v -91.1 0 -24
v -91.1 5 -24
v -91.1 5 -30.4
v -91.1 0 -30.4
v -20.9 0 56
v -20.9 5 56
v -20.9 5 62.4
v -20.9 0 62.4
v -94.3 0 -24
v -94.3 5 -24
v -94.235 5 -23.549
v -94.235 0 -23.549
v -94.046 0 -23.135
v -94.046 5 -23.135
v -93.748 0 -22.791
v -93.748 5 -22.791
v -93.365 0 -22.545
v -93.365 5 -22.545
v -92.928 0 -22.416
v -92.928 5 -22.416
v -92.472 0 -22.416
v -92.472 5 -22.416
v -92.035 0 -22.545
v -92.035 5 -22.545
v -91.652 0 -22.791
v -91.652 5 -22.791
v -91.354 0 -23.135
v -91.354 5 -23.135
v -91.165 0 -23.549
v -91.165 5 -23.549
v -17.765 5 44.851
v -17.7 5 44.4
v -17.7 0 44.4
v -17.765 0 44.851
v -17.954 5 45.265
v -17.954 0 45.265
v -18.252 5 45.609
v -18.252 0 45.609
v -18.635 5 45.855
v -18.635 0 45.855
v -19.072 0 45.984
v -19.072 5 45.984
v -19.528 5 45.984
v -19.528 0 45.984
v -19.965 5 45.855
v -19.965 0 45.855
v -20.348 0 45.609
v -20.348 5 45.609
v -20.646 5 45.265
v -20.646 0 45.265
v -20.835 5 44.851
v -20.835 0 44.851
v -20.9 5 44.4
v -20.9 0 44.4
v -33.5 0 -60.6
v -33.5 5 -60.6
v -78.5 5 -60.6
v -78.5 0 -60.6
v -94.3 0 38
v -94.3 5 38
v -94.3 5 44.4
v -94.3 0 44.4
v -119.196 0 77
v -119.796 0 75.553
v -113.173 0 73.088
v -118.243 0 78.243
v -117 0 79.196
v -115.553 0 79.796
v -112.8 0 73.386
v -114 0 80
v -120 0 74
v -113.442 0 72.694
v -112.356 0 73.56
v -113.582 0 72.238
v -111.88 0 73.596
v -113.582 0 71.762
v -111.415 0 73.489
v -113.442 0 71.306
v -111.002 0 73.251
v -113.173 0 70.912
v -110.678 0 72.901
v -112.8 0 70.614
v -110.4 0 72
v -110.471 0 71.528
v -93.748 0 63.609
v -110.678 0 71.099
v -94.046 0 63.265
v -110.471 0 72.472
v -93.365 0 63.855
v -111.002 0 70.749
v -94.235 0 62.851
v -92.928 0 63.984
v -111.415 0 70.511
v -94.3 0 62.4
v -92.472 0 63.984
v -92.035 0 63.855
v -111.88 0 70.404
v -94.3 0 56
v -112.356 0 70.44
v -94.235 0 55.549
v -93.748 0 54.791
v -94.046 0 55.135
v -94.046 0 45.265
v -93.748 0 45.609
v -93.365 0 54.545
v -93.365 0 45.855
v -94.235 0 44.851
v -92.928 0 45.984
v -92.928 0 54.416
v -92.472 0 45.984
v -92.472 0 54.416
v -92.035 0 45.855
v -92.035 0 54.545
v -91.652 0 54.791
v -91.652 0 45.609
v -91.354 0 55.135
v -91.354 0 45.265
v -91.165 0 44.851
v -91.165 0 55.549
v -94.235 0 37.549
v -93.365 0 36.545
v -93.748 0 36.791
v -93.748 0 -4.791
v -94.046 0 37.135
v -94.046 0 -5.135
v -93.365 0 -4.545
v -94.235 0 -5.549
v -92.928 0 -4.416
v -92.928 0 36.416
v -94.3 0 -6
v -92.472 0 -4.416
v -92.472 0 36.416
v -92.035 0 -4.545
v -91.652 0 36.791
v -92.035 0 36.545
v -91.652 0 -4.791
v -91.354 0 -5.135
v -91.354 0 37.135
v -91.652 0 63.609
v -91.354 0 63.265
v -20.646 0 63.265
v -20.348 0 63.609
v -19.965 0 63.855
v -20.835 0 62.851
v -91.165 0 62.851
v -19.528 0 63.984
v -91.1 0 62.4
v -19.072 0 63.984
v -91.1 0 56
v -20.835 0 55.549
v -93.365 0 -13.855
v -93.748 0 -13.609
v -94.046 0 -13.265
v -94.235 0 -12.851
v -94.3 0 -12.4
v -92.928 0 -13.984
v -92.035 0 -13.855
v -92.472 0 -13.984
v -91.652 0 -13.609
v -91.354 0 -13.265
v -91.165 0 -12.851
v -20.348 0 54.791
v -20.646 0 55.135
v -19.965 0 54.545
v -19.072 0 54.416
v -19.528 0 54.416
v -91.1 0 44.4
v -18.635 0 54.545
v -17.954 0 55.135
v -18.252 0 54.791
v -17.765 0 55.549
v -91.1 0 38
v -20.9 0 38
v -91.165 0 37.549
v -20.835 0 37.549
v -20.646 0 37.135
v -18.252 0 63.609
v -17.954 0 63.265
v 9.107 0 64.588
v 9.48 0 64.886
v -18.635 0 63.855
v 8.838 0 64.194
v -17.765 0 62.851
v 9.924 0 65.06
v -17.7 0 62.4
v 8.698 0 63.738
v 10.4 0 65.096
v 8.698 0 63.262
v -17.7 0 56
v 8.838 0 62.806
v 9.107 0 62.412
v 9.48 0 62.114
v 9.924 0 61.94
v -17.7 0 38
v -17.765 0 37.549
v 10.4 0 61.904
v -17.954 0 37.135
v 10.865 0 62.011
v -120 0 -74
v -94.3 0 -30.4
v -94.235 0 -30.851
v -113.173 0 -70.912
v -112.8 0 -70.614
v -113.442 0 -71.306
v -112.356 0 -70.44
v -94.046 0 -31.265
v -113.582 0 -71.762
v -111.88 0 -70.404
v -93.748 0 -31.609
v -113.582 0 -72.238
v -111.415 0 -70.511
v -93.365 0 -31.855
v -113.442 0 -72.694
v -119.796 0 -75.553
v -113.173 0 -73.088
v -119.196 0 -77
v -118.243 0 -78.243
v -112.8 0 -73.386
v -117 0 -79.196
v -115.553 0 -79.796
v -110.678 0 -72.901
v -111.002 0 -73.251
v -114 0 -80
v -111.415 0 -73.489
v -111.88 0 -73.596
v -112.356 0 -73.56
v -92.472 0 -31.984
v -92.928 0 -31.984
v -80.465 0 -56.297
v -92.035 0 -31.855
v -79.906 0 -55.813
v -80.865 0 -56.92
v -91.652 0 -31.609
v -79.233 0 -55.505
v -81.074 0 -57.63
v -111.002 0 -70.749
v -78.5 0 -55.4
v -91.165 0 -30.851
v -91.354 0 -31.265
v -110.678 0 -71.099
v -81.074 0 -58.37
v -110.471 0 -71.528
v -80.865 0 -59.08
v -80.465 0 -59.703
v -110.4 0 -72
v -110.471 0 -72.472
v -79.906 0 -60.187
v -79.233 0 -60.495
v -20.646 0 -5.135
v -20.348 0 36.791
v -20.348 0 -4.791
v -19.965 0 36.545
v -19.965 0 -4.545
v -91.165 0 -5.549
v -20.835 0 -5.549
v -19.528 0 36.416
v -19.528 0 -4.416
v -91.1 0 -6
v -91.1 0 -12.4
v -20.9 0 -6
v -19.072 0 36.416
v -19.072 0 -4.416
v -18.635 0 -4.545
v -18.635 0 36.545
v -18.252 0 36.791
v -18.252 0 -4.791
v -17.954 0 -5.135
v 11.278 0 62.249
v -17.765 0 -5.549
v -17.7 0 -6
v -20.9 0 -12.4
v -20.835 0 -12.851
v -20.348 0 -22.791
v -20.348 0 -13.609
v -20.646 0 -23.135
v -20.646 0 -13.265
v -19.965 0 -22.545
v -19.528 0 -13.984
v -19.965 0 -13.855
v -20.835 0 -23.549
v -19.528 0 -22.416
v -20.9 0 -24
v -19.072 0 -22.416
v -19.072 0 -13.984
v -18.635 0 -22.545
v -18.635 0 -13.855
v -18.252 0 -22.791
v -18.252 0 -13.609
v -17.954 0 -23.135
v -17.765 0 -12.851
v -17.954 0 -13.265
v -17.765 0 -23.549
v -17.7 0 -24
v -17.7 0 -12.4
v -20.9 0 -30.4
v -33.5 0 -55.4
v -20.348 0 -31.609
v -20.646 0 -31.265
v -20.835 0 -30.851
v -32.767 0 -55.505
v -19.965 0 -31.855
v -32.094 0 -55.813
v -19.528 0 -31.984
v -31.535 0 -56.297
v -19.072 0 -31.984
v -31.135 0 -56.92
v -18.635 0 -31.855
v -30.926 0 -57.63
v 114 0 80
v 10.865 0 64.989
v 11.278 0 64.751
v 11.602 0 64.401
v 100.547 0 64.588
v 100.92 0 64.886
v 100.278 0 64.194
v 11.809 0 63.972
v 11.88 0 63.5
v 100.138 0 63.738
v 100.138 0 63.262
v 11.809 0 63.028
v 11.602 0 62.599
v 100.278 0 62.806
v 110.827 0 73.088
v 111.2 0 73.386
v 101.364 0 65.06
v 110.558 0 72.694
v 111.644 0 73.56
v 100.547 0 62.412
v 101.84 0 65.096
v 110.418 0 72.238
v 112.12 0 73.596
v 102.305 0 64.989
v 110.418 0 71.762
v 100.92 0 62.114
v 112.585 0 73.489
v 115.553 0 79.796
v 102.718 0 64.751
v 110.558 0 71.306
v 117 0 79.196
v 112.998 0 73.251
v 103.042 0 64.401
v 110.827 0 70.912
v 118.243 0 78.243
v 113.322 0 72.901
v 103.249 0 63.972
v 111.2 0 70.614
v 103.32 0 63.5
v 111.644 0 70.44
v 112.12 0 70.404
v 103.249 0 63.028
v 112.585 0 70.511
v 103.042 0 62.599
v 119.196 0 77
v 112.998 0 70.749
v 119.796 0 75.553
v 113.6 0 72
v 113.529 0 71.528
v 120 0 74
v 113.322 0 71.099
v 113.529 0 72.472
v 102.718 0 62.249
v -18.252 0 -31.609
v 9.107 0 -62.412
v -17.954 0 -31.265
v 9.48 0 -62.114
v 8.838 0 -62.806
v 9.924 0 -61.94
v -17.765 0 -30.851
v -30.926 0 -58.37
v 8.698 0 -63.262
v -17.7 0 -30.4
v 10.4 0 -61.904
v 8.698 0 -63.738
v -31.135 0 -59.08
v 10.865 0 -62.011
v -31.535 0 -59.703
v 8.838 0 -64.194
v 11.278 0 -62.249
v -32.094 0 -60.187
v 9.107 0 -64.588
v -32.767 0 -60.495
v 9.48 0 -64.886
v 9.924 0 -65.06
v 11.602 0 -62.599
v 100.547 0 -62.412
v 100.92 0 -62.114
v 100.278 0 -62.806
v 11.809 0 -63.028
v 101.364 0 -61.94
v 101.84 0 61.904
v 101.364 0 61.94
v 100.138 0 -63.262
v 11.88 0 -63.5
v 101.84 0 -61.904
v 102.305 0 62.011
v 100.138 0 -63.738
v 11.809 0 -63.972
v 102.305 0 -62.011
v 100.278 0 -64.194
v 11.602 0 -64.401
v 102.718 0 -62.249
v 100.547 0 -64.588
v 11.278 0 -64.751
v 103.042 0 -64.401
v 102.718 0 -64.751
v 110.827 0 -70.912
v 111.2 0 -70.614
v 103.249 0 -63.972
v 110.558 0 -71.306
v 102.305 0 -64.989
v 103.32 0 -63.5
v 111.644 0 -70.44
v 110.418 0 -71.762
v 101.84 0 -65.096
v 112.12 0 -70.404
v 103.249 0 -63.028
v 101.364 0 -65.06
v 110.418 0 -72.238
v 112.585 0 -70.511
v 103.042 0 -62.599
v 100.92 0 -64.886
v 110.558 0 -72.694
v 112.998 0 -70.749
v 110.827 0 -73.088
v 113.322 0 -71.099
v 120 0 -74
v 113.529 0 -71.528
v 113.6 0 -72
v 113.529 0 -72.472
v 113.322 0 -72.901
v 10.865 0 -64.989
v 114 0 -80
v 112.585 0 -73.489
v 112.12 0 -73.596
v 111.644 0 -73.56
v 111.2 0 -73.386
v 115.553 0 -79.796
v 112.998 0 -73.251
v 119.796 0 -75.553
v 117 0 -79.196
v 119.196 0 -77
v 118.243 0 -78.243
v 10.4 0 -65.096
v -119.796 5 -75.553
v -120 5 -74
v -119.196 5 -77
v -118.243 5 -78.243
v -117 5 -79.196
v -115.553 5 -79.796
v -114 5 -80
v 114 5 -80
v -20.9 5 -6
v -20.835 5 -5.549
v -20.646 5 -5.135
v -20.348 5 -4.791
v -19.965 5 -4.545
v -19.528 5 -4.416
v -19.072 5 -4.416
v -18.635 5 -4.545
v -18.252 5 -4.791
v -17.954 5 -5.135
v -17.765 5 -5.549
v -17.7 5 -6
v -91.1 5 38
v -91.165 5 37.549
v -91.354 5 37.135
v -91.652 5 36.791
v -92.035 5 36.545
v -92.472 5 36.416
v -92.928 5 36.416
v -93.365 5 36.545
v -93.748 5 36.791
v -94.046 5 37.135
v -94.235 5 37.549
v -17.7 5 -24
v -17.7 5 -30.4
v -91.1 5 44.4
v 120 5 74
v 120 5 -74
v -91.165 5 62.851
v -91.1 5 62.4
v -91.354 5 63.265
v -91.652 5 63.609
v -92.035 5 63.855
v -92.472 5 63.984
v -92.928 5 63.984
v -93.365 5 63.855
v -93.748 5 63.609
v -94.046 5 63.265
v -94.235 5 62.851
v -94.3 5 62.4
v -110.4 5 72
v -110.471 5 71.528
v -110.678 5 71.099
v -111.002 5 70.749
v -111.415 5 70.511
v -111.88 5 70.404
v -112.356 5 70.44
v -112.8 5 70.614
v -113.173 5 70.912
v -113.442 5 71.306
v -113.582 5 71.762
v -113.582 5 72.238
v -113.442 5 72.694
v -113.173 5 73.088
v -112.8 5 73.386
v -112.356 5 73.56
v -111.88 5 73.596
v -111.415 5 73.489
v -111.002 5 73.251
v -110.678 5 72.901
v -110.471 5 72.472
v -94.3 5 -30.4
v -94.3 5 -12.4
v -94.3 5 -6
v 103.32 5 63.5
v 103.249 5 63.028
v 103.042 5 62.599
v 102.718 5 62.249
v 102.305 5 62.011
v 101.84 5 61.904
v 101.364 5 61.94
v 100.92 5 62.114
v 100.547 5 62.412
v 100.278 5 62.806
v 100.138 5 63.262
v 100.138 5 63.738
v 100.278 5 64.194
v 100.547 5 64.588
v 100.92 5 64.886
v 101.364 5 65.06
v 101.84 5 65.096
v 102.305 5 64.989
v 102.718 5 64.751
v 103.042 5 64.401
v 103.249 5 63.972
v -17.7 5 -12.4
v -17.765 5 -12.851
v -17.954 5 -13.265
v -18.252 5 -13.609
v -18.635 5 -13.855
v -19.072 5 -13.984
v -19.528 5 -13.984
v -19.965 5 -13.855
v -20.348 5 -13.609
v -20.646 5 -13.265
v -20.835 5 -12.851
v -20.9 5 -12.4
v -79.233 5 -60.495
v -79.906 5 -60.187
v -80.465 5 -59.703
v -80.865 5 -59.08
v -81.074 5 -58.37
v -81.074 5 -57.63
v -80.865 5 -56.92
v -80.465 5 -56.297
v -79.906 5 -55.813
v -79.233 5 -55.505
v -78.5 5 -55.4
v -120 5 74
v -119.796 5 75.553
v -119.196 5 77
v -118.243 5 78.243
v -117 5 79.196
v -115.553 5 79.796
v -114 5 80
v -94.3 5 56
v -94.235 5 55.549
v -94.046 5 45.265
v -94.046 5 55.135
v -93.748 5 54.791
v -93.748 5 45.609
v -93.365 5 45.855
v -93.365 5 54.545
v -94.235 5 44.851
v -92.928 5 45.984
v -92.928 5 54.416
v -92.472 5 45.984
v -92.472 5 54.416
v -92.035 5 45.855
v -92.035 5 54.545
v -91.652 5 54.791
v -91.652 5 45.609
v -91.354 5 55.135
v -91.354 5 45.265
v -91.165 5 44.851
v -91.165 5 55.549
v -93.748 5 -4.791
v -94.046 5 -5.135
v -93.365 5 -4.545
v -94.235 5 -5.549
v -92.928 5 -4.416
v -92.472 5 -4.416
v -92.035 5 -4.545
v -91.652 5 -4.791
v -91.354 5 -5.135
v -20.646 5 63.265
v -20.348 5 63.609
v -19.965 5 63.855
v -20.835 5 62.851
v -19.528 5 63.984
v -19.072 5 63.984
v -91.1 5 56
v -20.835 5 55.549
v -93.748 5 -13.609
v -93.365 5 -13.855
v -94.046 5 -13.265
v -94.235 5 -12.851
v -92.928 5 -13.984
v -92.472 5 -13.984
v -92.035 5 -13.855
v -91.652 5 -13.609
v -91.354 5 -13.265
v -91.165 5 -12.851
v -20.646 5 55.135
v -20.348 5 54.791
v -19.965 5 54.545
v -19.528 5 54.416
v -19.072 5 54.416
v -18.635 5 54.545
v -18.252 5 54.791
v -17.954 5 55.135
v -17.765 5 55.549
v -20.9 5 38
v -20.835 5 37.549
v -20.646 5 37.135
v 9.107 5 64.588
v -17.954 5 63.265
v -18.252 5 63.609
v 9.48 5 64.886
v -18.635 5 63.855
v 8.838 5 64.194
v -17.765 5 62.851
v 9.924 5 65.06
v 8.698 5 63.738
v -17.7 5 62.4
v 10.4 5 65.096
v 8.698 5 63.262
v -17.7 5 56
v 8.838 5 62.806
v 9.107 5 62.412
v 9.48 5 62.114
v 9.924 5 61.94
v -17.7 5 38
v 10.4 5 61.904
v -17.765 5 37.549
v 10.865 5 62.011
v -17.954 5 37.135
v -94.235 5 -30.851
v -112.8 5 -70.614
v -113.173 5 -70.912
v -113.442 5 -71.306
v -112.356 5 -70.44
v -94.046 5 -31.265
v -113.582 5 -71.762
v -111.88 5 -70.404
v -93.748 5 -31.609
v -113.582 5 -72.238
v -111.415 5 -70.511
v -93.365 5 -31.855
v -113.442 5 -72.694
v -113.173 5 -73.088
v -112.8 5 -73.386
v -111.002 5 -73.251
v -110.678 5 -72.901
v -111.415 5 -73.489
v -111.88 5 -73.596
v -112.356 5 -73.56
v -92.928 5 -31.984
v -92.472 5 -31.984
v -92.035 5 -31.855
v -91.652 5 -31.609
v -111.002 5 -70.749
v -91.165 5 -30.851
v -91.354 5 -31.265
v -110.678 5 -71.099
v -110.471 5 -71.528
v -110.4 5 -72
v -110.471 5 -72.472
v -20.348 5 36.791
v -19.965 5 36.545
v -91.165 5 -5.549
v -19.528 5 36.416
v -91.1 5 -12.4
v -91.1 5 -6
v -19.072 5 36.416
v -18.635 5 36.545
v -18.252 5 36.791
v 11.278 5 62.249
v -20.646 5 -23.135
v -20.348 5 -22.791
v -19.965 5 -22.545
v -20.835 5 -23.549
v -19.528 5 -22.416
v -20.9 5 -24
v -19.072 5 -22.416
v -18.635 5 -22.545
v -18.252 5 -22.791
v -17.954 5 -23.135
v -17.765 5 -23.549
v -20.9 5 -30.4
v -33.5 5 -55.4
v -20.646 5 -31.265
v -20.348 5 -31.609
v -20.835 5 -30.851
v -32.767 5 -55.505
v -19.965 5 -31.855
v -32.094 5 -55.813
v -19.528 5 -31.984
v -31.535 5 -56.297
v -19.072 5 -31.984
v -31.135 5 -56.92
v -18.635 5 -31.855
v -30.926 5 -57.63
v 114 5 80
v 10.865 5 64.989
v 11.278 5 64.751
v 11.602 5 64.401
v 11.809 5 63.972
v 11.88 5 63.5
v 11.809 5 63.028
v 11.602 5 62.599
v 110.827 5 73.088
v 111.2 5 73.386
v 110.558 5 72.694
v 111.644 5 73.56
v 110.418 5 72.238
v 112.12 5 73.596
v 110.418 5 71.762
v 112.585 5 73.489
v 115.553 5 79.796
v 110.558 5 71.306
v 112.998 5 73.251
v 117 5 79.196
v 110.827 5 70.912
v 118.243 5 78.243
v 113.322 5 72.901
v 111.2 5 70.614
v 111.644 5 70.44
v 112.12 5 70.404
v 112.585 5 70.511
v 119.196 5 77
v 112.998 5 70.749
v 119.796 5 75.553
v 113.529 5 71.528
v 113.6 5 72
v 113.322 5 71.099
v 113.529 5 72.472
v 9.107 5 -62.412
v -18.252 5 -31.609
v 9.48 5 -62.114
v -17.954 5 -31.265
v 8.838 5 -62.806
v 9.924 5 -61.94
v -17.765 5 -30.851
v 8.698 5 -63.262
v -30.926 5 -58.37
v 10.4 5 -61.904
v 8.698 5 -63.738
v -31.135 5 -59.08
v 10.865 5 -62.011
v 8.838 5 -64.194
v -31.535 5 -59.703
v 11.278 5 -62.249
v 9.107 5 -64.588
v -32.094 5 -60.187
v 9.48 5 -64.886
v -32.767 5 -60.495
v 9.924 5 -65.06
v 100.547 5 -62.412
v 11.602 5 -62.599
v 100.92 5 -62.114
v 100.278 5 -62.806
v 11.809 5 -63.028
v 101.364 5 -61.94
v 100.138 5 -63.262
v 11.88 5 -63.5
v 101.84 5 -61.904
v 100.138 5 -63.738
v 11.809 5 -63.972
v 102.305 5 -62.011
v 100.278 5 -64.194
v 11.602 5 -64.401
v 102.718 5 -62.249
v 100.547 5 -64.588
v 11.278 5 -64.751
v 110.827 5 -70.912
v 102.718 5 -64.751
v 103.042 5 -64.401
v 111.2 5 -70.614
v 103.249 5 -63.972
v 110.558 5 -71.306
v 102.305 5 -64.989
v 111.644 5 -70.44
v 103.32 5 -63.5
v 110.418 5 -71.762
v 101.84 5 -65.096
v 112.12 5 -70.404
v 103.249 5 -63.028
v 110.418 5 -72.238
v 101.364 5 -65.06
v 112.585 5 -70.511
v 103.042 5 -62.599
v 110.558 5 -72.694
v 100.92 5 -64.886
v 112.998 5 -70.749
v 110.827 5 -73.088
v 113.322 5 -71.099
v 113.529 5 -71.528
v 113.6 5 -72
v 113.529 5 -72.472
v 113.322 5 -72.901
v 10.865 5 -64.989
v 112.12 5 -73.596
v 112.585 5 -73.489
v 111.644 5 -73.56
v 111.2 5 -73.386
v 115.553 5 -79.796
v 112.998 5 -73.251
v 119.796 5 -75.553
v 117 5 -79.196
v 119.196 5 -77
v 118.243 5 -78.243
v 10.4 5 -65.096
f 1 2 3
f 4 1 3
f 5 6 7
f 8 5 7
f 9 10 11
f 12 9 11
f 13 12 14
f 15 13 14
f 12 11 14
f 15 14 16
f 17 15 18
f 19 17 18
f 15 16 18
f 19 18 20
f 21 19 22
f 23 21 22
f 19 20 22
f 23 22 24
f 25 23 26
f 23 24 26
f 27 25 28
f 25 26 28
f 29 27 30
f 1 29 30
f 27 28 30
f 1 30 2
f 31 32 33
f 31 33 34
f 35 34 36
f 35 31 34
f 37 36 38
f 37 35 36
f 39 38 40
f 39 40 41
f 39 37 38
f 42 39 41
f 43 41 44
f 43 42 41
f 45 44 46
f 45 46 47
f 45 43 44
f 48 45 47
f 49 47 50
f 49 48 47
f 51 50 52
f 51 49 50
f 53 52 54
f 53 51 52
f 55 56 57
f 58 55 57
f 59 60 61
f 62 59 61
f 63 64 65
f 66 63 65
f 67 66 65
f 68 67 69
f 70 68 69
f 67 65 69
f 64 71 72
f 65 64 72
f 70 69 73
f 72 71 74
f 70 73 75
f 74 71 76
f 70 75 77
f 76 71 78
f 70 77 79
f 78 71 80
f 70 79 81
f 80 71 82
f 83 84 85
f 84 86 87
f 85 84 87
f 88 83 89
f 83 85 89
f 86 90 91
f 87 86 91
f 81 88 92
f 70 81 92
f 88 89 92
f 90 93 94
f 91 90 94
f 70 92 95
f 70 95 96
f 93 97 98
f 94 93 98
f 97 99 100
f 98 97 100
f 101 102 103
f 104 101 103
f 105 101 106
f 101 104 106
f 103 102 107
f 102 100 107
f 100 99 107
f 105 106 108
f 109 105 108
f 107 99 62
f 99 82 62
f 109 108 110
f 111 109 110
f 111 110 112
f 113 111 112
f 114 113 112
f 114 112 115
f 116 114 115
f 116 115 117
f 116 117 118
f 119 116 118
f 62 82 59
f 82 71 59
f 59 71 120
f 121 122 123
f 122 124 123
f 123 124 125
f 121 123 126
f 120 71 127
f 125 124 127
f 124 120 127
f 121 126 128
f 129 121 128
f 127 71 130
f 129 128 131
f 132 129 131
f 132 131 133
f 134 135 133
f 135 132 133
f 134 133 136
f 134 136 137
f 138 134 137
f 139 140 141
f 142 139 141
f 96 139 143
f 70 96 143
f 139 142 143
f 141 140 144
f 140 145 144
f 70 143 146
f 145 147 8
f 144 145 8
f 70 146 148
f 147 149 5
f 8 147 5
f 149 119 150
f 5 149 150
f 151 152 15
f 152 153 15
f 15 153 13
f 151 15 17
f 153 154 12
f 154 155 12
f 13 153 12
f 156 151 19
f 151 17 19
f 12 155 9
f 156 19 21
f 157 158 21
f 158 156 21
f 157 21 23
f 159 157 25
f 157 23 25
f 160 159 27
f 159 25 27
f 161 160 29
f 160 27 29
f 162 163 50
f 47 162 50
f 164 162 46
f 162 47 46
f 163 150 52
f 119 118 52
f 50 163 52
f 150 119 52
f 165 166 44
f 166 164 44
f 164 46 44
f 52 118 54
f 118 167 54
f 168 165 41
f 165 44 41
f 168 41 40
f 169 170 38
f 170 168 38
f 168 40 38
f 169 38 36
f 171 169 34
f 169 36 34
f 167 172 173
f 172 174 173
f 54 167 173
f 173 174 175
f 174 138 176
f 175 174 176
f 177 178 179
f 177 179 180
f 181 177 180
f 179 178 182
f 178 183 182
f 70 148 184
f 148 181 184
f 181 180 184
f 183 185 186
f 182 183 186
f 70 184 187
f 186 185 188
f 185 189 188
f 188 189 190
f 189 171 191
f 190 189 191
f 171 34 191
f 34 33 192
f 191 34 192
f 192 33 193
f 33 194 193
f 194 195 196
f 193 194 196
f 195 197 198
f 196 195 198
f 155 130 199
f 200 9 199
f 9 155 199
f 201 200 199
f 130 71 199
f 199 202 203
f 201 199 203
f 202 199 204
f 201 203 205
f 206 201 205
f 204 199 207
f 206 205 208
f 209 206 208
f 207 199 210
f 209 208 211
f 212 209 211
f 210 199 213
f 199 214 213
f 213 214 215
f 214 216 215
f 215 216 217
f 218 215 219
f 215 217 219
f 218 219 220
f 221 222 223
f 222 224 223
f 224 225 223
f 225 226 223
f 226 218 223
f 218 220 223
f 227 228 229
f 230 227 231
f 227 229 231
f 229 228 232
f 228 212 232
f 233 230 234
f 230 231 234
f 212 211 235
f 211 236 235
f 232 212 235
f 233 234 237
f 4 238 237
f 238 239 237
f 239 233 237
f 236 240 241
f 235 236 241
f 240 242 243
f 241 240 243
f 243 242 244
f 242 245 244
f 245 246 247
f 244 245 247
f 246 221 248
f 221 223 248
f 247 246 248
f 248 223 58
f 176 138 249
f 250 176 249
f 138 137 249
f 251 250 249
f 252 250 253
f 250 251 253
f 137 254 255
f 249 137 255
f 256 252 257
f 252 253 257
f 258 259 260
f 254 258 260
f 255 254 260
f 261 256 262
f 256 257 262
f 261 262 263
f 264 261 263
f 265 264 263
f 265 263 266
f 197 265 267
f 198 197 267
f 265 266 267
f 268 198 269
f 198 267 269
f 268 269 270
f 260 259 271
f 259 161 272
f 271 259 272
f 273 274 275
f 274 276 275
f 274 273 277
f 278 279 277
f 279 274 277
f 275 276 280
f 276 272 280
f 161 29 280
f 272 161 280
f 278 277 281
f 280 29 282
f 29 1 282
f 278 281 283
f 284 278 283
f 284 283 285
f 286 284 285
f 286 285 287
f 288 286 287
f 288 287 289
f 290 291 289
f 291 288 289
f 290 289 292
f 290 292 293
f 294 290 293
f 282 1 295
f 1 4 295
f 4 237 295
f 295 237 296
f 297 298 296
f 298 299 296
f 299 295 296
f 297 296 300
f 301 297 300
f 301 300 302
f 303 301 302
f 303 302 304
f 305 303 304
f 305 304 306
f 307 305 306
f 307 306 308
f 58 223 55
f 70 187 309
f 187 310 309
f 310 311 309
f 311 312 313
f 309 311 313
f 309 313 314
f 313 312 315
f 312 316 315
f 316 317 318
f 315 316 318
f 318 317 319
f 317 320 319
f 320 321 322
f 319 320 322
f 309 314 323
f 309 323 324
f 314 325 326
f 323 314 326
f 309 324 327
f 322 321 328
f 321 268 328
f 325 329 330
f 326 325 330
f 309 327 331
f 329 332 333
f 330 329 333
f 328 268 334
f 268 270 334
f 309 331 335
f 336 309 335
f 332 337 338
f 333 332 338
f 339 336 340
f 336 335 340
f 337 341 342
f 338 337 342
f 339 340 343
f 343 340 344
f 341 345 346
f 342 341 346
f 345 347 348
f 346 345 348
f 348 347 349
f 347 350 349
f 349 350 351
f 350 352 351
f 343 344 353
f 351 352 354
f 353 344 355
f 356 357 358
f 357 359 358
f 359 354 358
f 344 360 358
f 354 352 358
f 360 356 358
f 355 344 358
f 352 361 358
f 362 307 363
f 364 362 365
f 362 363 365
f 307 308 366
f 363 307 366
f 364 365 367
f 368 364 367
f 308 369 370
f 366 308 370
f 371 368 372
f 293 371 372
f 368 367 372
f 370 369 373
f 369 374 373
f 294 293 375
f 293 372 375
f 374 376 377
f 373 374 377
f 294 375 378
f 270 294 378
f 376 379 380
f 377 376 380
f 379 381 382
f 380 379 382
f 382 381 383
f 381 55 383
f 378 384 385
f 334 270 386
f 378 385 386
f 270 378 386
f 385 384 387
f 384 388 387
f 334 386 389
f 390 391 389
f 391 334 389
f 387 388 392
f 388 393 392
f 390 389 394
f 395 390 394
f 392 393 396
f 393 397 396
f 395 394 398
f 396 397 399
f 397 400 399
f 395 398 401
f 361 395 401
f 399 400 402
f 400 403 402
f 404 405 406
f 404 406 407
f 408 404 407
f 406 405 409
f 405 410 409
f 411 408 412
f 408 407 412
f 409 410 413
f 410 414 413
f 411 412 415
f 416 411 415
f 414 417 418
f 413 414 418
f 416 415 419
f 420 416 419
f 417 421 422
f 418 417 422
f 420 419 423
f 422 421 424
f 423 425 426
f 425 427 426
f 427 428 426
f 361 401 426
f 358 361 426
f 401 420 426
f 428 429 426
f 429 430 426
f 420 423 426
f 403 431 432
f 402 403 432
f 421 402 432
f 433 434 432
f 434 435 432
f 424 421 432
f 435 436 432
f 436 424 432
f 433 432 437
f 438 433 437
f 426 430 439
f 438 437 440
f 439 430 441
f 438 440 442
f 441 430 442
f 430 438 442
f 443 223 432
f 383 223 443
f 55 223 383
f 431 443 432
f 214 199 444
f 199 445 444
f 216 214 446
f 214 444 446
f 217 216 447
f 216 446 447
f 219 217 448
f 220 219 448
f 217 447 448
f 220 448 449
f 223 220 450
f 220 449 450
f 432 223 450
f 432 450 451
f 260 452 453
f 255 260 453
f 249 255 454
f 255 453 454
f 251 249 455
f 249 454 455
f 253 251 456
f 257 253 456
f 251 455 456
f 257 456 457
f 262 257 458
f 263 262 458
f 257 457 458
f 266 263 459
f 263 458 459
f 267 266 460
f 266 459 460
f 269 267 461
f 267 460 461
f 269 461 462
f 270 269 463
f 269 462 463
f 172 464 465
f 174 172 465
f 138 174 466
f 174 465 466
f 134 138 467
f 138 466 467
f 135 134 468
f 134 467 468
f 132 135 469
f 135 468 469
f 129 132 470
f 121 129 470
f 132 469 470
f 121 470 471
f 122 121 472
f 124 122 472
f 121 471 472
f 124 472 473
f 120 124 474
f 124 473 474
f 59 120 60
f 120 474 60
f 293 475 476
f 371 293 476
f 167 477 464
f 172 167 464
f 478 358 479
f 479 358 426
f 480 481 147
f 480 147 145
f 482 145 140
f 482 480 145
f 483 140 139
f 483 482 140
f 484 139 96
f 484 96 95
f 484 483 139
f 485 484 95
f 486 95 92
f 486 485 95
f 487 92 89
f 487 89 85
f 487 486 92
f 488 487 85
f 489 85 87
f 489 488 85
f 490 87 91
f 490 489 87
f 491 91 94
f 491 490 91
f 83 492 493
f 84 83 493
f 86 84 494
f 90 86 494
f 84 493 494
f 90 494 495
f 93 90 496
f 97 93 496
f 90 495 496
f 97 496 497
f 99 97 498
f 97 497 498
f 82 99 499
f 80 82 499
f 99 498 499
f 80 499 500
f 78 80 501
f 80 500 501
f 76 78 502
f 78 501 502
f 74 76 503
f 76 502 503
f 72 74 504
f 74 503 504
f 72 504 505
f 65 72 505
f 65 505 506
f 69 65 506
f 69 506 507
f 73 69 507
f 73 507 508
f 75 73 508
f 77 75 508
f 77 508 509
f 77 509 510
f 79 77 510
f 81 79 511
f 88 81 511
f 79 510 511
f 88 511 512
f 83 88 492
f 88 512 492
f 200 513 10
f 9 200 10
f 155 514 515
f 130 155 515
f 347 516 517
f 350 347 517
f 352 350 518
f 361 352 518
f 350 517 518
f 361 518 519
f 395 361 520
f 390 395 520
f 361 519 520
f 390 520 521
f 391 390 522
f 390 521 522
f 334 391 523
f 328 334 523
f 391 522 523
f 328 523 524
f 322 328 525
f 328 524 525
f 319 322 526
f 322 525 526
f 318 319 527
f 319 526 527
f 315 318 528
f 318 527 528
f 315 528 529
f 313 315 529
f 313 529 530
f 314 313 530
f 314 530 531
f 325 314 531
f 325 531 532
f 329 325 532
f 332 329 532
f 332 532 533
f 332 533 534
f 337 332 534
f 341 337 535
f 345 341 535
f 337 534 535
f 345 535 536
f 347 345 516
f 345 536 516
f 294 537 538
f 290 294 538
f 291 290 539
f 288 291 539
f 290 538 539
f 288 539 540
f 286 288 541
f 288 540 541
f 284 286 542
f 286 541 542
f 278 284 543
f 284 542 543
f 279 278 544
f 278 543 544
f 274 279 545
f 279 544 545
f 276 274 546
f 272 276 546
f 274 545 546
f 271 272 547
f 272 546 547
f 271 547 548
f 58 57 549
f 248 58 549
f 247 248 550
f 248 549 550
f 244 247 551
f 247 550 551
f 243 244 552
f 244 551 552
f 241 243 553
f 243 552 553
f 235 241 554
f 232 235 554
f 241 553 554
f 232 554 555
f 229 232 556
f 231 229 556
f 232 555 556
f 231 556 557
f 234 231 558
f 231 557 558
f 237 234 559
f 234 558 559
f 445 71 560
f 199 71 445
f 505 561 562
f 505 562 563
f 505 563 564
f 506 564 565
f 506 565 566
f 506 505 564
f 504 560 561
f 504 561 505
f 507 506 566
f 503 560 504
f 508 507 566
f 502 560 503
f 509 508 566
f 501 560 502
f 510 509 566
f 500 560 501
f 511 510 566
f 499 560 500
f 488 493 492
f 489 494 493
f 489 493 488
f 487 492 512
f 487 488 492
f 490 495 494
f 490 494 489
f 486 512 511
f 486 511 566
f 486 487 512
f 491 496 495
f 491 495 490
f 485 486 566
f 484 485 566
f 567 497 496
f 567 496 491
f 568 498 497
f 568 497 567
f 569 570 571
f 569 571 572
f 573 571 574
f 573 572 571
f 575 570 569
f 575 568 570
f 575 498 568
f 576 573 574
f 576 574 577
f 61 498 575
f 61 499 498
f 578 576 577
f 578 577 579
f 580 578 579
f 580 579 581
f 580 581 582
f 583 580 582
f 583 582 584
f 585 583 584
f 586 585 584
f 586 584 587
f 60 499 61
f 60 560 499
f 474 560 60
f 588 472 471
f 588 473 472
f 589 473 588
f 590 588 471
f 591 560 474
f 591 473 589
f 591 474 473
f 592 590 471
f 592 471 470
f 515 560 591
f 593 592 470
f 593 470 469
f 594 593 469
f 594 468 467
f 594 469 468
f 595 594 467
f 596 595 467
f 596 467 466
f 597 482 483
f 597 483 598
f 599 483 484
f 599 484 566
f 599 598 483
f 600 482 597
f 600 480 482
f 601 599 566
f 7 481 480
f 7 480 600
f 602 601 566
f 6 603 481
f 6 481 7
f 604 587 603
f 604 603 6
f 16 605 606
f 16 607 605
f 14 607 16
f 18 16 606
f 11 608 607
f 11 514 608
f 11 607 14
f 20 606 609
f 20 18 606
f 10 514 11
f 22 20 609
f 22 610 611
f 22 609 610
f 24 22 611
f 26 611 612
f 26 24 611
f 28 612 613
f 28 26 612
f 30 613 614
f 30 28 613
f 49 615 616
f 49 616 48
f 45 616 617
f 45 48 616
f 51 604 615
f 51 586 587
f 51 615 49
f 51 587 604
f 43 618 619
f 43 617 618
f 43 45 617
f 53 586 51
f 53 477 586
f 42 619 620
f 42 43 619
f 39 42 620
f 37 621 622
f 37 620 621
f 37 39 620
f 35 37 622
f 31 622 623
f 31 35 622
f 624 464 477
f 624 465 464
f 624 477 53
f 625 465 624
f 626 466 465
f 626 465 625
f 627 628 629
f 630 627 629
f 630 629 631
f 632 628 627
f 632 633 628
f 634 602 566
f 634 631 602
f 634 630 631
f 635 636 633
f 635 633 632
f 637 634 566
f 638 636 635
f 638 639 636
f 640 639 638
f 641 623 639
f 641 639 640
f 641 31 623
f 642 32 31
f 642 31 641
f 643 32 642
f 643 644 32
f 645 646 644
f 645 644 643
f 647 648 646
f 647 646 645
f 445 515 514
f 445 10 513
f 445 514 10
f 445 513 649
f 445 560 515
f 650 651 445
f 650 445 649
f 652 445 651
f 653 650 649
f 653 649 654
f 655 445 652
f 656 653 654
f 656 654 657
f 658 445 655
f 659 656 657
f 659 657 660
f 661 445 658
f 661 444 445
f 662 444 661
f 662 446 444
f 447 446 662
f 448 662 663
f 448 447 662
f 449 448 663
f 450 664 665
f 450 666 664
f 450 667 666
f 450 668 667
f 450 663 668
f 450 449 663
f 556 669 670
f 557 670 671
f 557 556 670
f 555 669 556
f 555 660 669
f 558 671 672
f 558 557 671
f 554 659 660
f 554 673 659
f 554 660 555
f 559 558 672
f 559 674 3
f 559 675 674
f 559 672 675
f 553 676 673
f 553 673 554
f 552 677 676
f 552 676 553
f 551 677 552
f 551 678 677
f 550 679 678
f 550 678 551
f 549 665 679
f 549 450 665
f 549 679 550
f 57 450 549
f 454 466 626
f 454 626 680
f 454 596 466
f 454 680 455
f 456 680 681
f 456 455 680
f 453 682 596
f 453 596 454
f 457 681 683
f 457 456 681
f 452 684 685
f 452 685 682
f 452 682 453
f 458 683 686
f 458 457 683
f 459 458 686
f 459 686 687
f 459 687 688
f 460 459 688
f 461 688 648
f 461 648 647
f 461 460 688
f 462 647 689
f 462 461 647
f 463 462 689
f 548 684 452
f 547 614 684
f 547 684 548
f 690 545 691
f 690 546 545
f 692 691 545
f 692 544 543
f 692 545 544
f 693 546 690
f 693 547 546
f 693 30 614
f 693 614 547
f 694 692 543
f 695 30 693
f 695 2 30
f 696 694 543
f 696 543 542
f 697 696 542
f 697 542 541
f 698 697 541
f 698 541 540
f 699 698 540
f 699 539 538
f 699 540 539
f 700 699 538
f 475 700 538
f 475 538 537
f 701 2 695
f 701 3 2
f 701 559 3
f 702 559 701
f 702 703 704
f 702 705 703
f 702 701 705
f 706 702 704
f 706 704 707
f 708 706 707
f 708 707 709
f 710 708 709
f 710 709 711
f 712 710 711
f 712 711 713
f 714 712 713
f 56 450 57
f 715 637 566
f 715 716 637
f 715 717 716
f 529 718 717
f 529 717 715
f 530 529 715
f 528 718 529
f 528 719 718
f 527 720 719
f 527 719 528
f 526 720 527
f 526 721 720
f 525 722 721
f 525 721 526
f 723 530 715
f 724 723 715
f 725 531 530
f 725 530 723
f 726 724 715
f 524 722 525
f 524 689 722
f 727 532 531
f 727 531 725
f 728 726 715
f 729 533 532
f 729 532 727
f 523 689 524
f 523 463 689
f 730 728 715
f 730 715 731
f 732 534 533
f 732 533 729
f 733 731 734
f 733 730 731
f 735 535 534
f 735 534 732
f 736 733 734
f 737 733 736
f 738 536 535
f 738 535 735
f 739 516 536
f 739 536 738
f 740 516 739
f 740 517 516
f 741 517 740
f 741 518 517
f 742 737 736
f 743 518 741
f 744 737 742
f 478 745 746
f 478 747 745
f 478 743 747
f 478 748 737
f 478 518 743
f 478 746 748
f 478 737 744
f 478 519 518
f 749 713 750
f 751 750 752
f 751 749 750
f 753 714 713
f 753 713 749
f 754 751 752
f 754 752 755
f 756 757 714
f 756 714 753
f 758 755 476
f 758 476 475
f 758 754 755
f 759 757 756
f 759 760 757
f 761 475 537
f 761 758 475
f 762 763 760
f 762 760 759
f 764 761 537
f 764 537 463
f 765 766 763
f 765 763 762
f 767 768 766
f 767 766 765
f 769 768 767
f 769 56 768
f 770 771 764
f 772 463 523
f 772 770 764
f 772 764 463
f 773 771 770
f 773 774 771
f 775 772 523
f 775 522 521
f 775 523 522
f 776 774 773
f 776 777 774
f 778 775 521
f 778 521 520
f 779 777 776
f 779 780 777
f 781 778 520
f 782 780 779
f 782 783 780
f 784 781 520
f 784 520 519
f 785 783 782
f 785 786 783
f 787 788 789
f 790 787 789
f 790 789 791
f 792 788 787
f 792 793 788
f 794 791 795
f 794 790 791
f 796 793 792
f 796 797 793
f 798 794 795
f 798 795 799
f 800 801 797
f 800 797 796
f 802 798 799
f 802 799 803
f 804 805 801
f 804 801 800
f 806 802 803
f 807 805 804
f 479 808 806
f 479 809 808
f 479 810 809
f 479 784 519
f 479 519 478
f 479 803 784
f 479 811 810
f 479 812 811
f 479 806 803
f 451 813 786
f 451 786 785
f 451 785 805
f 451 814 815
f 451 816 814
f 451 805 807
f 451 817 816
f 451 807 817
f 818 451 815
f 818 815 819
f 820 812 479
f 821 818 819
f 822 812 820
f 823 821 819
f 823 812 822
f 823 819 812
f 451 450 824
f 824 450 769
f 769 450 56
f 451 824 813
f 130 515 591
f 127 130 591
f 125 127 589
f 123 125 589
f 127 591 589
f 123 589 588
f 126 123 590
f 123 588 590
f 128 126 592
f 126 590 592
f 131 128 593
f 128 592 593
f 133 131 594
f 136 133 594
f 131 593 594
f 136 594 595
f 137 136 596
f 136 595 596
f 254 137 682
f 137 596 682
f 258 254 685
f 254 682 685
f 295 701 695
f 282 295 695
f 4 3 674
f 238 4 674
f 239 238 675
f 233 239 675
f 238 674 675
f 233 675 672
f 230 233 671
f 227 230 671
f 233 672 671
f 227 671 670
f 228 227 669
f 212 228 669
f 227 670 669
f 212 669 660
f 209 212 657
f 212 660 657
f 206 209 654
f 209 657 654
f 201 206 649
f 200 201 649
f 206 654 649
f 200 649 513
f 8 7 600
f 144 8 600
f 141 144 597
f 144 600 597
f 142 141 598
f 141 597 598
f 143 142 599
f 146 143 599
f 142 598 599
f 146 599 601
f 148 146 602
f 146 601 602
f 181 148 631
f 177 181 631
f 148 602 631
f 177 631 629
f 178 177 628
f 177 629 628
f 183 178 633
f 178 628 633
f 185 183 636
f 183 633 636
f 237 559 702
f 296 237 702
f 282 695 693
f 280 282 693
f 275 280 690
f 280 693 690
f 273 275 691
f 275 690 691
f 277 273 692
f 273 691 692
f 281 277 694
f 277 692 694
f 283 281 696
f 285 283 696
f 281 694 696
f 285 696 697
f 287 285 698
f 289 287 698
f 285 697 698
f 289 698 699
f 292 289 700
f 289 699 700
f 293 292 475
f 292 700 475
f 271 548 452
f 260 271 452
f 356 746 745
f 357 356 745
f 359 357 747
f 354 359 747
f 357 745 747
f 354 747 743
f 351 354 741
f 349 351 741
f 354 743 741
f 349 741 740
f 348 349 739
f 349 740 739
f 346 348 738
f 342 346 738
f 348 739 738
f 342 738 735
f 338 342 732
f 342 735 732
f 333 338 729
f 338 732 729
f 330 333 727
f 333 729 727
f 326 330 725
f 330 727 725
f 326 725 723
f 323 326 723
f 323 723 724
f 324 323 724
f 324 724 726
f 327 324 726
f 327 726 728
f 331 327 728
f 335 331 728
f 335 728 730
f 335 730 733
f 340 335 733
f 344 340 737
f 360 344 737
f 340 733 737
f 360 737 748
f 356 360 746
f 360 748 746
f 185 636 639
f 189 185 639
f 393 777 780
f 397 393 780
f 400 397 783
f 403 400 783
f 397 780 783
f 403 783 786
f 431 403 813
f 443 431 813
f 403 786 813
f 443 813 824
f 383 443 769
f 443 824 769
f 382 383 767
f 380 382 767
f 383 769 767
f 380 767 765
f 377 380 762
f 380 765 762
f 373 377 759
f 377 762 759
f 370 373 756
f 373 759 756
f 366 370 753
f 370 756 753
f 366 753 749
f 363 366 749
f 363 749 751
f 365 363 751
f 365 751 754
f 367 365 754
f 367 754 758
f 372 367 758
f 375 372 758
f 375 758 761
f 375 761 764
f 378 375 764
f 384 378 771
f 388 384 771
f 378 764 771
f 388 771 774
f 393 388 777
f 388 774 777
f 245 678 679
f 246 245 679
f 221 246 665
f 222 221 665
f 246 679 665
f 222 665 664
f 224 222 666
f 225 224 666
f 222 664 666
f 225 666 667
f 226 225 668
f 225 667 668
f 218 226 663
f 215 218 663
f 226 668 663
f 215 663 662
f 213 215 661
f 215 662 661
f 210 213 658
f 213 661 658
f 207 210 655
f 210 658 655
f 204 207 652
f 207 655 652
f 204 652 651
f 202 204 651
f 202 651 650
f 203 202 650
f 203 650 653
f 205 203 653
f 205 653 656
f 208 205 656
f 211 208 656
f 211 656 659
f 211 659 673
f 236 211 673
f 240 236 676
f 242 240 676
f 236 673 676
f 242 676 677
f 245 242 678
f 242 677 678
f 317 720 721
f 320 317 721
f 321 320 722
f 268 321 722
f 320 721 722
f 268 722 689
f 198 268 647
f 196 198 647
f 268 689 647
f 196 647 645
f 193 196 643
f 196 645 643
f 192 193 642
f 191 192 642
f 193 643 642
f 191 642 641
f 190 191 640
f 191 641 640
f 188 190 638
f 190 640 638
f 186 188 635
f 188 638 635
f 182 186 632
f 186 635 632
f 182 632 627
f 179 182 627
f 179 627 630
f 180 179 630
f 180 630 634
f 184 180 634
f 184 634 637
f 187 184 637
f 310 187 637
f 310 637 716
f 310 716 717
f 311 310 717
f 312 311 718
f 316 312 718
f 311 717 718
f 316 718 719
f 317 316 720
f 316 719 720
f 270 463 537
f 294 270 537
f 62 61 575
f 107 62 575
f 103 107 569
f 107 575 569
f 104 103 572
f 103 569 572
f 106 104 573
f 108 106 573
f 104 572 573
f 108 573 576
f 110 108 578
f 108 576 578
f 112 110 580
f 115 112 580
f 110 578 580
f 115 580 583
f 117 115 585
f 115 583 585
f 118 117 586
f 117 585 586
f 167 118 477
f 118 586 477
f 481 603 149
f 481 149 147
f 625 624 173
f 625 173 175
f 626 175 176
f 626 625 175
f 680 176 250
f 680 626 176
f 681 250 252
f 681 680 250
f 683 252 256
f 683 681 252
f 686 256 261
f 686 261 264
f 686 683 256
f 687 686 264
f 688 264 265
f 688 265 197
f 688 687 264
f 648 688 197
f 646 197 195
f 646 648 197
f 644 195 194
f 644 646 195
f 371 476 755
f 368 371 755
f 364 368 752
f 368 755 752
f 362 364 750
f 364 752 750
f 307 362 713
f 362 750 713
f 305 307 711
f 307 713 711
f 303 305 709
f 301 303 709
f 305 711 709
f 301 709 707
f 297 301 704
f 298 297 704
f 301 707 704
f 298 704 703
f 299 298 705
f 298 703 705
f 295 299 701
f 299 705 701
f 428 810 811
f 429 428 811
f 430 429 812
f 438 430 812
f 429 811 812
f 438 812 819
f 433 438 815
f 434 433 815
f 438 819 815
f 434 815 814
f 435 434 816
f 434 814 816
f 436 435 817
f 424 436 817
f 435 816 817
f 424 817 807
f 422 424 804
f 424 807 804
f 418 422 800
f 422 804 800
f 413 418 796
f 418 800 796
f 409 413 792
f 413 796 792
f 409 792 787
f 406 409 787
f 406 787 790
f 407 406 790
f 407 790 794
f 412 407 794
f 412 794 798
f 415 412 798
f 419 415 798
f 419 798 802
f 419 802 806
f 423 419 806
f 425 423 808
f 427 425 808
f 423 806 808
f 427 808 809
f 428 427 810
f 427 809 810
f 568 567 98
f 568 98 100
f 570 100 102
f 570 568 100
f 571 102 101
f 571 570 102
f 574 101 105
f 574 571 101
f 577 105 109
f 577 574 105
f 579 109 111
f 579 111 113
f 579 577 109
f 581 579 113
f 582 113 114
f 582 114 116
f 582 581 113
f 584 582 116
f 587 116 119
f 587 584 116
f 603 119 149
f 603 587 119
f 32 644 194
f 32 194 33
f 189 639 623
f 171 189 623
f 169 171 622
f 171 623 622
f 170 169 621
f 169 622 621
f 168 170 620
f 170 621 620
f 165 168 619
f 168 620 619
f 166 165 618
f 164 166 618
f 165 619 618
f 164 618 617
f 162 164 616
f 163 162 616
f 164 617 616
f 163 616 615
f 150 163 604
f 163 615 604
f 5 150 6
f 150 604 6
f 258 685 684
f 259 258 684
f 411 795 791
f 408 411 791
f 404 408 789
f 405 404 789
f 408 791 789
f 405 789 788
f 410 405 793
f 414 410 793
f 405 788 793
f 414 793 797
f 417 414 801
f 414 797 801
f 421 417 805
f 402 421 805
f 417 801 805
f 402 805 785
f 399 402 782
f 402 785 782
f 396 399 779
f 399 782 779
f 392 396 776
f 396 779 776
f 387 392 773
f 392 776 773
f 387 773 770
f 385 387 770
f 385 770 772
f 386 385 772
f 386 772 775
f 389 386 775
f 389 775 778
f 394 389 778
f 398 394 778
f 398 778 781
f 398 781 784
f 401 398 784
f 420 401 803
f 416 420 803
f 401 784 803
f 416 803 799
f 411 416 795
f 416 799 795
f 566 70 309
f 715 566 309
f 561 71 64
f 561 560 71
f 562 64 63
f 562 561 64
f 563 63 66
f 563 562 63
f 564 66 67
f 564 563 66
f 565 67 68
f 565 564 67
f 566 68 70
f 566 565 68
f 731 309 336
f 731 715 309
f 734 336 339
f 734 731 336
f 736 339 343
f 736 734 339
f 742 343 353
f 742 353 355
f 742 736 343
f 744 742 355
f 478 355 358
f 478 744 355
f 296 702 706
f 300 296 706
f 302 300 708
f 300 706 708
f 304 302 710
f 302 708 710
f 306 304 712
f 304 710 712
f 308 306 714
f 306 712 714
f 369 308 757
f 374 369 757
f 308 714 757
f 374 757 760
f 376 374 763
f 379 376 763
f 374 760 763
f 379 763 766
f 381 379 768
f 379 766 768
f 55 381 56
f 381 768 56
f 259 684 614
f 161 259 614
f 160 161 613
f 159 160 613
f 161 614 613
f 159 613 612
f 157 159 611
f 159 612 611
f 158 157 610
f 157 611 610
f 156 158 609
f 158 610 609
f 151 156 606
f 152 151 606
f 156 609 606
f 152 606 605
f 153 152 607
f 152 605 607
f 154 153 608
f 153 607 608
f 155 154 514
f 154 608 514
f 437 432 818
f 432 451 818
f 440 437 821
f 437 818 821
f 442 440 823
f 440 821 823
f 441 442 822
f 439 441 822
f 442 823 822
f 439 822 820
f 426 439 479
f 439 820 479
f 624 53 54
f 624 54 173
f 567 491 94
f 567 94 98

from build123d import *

# Parameters (mm, degrees)
SKETCH1_W           = 240
SKETCH1_H           = 160
BOSS_EXTRUDE1_DEPTH = 5
SKETCH2_R           = 1.6
CUT_EXTRUDE1_DEPTH  = 5
FILLET1_R           = 6


with BuildPart() as part:
    # Sketch1 → Boss-Extrude1 (new body)
    with BuildSketch(Plane(origin=(0, 0, 0), x_dir=(1, 0, 0), z_dir=(0, 1, 0))):
        Rectangle(SKETCH1_W, SKETCH1_H)
    extrude(amount=BOSS_EXTRUDE1_DEPTH)

    # Sketch2 → Cut-Extrude1 (cut)
    with BuildSketch(Plane(origin=(0, 5, 0), x_dir=(1, 0, 0), z_dir=(0, 1, 0))):
        with Locations((-112, 72)):
            Circle(SKETCH2_R)
        with Locations((-112, -72)):
            Circle(SKETCH2_R)
        with Locations((112, 72)):
            Circle(SKETCH2_R)
        with Locations((112, -72)):
            Circle(SKETCH2_R)
        with Locations((10.28, 63.5)):
            Circle(SKETCH2_R)
        with Locations((101.72, 63.5)):
            Circle(SKETCH2_R)
        with Locations((101.72, -63.5)):
            Circle(SKETCH2_R)
        with Locations((10.28, -63.5)):
            Circle(SKETCH2_R)
        with BuildLine():
            Line((-94.3, 30.4), (-94.3, 24))
            ThreePointArc((-94.3, 24), (-92.7, 22.4), (-91.1, 24))
            Line((-91.1, 24), (-91.1, 30.4))
            ThreePointArc((-91.1, 30.4), (-92.7, 32), (-94.3, 30.4))
        make_face()
        with BuildLine():
            Line((-94.3, 12.4), (-94.3, 6))
            ThreePointArc((-94.3, 6), (-92.7, 4.4), (-91.1, 6))
            Line((-91.1, 6), (-91.1, 12.4))
            ThreePointArc((-91.1, 12.4), (-92.7, 14), (-94.3, 12.4))
        make_face()
        with BuildLine():
            Line((-20.9, 12.4), (-20.9, 6))
            ThreePointArc((-20.9, 6), (-19.3, 4.4), (-17.7, 6))
            Line((-17.7, 6), (-17.7, 12.4))
            ThreePointArc((-17.7, 12.4), (-19.3, 14), (-20.9, 12.4))
        make_face()
        with BuildLine():
            Line((-20.9, 30.4), (-20.9, 24))
            ThreePointArc((-20.9, 24), (-19.3, 22.4), (-17.7, 24))
            Line((-17.7, 24), (-17.7, 30.4))
            ThreePointArc((-17.7, 30.4), (-19.3, 32), (-20.9, 30.4))
        make_face()
        with BuildLine():
            Line((-94.3, -62.4), (-94.3, -56))
            ThreePointArc((-94.3, -56), (-92.7, -54.4), (-91.1, -56))
            Line((-91.1, -56), (-91.1, -62.4))
            ThreePointArc((-91.1, -62.4), (-92.7, -64), (-94.3, -62.4))
        make_face()
        with BuildLine():
            Line((-91.1, -44.4), (-91.1, -38))
            ThreePointArc((-91.1, -38), (-92.7, -36.4), (-94.3, -38))
            Line((-94.3, -38), (-94.3, -44.4))
            ThreePointArc((-94.3, -44.4), (-92.7, -46), (-91.1, -44.4))
        make_face()
        with BuildLine():
            Line((-78.5, 55.4), (-33.5, 55.4))
            ThreePointArc((-33.5, 55.4), (-30.9, 58), (-33.5, 60.6))
            Line((-33.5, 60.6), (-78.5, 60.6))
            ThreePointArc((-78.5, 60.6), (-81.1, 58), (-78.5, 55.4))
        make_face()
        with BuildLine():
            Line((-17.7, -62.4), (-17.7, -56))
            ThreePointArc((-17.7, -56), (-19.3, -54.4), (-20.9, -56))
            Line((-20.9, -56), (-20.9, -62.4))
            ThreePointArc((-20.9, -62.4), (-19.3, -64), (-17.7, -62.4))
        make_face()
        with BuildLine():
            Line((-20.9, -44.4), (-20.9, -38))
            ThreePointArc((-20.9, -38), (-19.3, -36.4), (-17.7, -38))
            Line((-17.7, -38), (-17.7, -44.4))
            ThreePointArc((-17.7, -44.4), (-19.3, -46), (-20.9, -44.4))
        make_face()
    extrude(amount=-CUT_EXTRUDE1_DEPTH, mode=Mode.SUBTRACT)

    # Fillet1
    fillet1_edges = [part.edges().sort_by_distance(p)[0] for p in [
        (120, 2.5, 80),
        (-120, 2.5, 80),
        (-120, 2.5, -80),
        (120, 2.5, -80),
    ]]
    fillet(fillet1_edges, radius=FILLET1_R)


solid = part.part
